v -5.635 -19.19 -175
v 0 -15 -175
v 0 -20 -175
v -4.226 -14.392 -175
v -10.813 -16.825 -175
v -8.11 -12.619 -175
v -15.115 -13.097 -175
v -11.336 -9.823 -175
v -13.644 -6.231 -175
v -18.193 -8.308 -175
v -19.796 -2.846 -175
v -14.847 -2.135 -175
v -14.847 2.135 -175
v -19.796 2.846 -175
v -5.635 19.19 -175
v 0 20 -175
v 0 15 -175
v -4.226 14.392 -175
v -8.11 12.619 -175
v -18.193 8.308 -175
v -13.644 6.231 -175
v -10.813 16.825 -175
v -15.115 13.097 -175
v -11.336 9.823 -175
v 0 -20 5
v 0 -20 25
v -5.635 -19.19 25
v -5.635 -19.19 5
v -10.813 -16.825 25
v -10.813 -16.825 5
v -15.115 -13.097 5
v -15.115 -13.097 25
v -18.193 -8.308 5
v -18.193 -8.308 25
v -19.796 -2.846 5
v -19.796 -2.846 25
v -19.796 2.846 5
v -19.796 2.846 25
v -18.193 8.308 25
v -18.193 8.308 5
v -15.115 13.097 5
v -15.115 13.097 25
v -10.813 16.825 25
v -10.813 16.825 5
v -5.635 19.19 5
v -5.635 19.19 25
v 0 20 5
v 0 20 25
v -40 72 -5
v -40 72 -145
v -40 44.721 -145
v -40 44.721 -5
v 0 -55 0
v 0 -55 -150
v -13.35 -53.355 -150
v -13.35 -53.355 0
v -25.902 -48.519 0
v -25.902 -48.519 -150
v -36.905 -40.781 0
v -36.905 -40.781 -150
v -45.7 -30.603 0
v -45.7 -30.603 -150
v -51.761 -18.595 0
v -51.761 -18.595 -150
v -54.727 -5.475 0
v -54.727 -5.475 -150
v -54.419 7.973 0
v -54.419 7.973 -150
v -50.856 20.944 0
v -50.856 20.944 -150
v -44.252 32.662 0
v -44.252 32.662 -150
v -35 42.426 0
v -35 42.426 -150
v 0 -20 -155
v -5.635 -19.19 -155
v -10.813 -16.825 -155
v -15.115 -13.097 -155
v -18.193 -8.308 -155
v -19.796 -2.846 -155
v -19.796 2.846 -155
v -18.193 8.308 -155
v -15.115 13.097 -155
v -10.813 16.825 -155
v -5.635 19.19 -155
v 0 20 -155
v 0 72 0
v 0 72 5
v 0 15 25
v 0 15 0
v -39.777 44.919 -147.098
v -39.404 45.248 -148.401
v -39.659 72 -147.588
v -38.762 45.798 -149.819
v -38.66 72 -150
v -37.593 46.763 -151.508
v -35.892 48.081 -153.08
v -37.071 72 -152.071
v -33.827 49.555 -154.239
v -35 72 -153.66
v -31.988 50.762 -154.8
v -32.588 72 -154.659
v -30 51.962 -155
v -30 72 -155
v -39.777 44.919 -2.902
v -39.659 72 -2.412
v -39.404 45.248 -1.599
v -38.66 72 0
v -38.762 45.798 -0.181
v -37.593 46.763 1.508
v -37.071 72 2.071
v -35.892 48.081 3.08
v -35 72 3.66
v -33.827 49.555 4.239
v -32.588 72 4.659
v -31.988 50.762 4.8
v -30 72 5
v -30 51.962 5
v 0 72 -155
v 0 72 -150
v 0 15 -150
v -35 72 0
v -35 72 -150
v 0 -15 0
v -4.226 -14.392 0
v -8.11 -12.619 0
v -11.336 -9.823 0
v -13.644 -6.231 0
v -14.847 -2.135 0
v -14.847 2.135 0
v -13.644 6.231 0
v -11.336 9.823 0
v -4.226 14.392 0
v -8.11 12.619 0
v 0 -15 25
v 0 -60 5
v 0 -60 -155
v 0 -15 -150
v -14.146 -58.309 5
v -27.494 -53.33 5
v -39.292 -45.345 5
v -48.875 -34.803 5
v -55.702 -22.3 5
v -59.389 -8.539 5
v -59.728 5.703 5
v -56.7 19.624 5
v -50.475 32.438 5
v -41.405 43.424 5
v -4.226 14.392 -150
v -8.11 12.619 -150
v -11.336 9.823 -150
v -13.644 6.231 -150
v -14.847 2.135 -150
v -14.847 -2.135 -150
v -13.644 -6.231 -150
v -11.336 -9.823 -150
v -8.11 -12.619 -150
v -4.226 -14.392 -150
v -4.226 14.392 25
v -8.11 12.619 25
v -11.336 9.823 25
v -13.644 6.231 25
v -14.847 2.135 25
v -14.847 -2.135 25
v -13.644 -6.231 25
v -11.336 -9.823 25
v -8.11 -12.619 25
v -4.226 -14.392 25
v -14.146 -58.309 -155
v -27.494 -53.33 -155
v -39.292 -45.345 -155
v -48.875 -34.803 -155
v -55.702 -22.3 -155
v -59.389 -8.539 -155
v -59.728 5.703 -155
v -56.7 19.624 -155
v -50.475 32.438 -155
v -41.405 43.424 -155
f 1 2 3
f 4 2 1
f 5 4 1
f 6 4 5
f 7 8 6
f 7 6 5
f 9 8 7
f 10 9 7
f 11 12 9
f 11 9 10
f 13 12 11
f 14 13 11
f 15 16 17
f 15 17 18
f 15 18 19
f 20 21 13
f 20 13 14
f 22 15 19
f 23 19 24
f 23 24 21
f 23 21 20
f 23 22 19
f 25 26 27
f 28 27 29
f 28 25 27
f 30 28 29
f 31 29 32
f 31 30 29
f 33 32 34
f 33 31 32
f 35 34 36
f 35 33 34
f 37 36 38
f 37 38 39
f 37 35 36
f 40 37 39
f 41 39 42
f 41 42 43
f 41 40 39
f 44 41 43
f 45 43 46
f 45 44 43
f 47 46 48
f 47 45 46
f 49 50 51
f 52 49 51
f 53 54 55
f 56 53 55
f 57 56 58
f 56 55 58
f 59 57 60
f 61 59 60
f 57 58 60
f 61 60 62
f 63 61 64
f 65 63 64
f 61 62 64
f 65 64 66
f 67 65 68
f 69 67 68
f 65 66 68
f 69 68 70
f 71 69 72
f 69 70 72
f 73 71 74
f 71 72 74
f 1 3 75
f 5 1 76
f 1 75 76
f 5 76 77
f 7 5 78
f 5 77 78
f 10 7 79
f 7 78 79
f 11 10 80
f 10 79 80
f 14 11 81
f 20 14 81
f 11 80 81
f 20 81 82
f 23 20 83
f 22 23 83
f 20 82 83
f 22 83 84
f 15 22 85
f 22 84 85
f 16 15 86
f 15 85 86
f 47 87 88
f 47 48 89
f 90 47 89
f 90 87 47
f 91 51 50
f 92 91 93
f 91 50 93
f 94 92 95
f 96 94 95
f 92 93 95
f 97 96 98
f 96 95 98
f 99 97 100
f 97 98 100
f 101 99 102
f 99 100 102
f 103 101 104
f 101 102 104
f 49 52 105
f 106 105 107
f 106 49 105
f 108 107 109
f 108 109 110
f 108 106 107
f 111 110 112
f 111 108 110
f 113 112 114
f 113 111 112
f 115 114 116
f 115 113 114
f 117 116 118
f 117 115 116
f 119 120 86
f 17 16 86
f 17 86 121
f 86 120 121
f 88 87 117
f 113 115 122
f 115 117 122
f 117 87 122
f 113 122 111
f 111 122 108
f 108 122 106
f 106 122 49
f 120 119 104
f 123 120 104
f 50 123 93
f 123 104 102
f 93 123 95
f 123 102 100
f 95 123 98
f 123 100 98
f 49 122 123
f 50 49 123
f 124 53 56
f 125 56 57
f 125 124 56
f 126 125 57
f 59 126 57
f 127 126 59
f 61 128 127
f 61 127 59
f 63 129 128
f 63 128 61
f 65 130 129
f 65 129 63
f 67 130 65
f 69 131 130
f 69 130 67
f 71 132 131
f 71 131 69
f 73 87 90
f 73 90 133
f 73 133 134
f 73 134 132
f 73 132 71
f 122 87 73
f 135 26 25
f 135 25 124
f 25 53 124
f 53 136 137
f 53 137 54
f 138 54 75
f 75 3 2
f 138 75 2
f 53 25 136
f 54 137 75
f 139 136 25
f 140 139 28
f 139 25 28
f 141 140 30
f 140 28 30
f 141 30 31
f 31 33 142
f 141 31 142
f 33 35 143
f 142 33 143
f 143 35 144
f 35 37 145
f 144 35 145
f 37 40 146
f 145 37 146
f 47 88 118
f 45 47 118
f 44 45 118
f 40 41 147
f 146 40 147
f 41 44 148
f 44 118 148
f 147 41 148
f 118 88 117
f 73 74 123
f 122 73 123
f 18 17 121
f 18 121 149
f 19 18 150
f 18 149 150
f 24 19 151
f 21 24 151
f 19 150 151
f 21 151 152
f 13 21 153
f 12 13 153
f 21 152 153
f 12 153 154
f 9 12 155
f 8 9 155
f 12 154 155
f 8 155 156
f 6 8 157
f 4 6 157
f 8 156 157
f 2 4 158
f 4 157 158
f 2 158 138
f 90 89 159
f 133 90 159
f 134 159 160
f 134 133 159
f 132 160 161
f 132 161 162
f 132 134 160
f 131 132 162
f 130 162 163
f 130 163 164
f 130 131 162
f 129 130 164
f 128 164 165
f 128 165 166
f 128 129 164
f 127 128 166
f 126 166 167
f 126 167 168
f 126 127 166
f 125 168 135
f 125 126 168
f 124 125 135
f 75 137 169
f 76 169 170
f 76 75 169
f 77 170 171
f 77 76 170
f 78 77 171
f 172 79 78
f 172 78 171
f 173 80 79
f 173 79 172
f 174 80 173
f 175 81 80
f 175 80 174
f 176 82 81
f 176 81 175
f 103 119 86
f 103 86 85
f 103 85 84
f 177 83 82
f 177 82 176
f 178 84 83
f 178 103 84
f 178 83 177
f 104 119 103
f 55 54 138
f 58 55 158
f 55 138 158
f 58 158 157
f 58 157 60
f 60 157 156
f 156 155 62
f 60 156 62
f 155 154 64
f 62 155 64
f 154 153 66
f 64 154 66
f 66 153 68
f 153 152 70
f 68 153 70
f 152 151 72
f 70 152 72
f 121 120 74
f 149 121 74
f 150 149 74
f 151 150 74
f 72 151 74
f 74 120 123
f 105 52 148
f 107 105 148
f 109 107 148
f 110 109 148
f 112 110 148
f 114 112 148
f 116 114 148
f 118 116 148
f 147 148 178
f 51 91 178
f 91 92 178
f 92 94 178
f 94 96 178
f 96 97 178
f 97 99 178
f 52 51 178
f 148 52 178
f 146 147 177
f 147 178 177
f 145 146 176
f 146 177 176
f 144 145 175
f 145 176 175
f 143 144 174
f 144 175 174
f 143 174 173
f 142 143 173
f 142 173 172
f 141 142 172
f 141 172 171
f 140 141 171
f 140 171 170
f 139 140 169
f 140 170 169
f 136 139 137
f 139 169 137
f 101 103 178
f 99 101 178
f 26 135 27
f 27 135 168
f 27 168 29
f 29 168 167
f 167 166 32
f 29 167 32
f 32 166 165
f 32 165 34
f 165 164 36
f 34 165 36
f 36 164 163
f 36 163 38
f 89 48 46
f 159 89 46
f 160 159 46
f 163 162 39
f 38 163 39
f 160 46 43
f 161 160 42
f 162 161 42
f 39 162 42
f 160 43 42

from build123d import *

# Parameters (mm, degrees)
DODANIE_WYCI_GNI_CIE1_DEPTH       = 25
DODANIE_WYCI_GNI_CIE2_DEPTH       = 5
WYCI_GNI_CIE_CIENKA_START         = -150
WYCI_GNI_CIE_CIENKA_CIANKA2_DEPTH = 150
ZAOKR_GLENIE1_R                   = 10


with BuildPart() as part:
    # Szkic1 → Dodanie-wyciągnięcie1 (new body)
    with BuildSketch(Plane.XY):
        with BuildLine():
            Line((0, 20), (0, 15))
            ThreePointArc((0, 15), (-15, 0), (0, -15))
            Line((0, -15), (0, -20))
            ThreePointArc((0, -20), (-20, 0), (0, 20))
        make_face()
    extrude(amount=DODANIE_WYCI_GNI_CIE1_DEPTH)

    # Szkic2 → Dodanie-wyciągnięcie2 (add)
    with BuildSketch(Plane.XY):
        with BuildLine():
            Line((0, -20), (0, -60))
            ThreePointArc((0, -60), (-56.050341538, -21.409325386), (-40, 44.72135955))
            Line((-40, 44.72135955), (-40, 72))
            Line((-40, 72), (0, 72))
            Line((0, 72), (0, 20))
            ThreePointArc((0, 20), (-20, 0), (0, -20))
        make_face()
    extrude(amount=DODANIE_WYCI_GNI_CIE2_DEPTH)


with BuildPart() as body_2:
    # Lustro1: mirrored copy
    add(part.part.mirror(Plane.XY.offset(-75)))


with BuildPart() as part_1:
    add(part.part)

    add(body_2.part)  # Wyciągnięcie-cienka ścianka2 merges body 2
    # Szkic3 → Wyciągnięcie-cienka ścianka2 (add)
    with BuildSketch(Plane.XY.offset(WYCI_GNI_CIE_CIENKA_START)):
        with BuildLine():
            Line((-40, 72), (-40, 44.72135955))
            ThreePointArc((-40, 44.72135955), (-56.050341538, -21.409325386), (0, -60))
            Line((0, -60), (0, -55))
            ThreePointArc((0, -55), (-51.76124215, -18.594994247), (-35, 42.426406871))
            Line((-35, 42.426406871), (-35, 72))
            Line((-35, 72), (-40, 72))
        make_face()
    extrude(amount=WYCI_GNI_CIE_CIENKA_CIANKA2_DEPTH)

    # Zaokrąglenie1
    zaokr_glenie1_edges = [part_1.edges().sort_by_distance(p)[0] for p in [
        (-40, 58.360679775, 5),
        (-40, 58.360679775, -155),
    ]]
    fillet(zaokr_glenie1_edges, radius=ZAOKR_GLENIE1_R)


solid = part_1.part
